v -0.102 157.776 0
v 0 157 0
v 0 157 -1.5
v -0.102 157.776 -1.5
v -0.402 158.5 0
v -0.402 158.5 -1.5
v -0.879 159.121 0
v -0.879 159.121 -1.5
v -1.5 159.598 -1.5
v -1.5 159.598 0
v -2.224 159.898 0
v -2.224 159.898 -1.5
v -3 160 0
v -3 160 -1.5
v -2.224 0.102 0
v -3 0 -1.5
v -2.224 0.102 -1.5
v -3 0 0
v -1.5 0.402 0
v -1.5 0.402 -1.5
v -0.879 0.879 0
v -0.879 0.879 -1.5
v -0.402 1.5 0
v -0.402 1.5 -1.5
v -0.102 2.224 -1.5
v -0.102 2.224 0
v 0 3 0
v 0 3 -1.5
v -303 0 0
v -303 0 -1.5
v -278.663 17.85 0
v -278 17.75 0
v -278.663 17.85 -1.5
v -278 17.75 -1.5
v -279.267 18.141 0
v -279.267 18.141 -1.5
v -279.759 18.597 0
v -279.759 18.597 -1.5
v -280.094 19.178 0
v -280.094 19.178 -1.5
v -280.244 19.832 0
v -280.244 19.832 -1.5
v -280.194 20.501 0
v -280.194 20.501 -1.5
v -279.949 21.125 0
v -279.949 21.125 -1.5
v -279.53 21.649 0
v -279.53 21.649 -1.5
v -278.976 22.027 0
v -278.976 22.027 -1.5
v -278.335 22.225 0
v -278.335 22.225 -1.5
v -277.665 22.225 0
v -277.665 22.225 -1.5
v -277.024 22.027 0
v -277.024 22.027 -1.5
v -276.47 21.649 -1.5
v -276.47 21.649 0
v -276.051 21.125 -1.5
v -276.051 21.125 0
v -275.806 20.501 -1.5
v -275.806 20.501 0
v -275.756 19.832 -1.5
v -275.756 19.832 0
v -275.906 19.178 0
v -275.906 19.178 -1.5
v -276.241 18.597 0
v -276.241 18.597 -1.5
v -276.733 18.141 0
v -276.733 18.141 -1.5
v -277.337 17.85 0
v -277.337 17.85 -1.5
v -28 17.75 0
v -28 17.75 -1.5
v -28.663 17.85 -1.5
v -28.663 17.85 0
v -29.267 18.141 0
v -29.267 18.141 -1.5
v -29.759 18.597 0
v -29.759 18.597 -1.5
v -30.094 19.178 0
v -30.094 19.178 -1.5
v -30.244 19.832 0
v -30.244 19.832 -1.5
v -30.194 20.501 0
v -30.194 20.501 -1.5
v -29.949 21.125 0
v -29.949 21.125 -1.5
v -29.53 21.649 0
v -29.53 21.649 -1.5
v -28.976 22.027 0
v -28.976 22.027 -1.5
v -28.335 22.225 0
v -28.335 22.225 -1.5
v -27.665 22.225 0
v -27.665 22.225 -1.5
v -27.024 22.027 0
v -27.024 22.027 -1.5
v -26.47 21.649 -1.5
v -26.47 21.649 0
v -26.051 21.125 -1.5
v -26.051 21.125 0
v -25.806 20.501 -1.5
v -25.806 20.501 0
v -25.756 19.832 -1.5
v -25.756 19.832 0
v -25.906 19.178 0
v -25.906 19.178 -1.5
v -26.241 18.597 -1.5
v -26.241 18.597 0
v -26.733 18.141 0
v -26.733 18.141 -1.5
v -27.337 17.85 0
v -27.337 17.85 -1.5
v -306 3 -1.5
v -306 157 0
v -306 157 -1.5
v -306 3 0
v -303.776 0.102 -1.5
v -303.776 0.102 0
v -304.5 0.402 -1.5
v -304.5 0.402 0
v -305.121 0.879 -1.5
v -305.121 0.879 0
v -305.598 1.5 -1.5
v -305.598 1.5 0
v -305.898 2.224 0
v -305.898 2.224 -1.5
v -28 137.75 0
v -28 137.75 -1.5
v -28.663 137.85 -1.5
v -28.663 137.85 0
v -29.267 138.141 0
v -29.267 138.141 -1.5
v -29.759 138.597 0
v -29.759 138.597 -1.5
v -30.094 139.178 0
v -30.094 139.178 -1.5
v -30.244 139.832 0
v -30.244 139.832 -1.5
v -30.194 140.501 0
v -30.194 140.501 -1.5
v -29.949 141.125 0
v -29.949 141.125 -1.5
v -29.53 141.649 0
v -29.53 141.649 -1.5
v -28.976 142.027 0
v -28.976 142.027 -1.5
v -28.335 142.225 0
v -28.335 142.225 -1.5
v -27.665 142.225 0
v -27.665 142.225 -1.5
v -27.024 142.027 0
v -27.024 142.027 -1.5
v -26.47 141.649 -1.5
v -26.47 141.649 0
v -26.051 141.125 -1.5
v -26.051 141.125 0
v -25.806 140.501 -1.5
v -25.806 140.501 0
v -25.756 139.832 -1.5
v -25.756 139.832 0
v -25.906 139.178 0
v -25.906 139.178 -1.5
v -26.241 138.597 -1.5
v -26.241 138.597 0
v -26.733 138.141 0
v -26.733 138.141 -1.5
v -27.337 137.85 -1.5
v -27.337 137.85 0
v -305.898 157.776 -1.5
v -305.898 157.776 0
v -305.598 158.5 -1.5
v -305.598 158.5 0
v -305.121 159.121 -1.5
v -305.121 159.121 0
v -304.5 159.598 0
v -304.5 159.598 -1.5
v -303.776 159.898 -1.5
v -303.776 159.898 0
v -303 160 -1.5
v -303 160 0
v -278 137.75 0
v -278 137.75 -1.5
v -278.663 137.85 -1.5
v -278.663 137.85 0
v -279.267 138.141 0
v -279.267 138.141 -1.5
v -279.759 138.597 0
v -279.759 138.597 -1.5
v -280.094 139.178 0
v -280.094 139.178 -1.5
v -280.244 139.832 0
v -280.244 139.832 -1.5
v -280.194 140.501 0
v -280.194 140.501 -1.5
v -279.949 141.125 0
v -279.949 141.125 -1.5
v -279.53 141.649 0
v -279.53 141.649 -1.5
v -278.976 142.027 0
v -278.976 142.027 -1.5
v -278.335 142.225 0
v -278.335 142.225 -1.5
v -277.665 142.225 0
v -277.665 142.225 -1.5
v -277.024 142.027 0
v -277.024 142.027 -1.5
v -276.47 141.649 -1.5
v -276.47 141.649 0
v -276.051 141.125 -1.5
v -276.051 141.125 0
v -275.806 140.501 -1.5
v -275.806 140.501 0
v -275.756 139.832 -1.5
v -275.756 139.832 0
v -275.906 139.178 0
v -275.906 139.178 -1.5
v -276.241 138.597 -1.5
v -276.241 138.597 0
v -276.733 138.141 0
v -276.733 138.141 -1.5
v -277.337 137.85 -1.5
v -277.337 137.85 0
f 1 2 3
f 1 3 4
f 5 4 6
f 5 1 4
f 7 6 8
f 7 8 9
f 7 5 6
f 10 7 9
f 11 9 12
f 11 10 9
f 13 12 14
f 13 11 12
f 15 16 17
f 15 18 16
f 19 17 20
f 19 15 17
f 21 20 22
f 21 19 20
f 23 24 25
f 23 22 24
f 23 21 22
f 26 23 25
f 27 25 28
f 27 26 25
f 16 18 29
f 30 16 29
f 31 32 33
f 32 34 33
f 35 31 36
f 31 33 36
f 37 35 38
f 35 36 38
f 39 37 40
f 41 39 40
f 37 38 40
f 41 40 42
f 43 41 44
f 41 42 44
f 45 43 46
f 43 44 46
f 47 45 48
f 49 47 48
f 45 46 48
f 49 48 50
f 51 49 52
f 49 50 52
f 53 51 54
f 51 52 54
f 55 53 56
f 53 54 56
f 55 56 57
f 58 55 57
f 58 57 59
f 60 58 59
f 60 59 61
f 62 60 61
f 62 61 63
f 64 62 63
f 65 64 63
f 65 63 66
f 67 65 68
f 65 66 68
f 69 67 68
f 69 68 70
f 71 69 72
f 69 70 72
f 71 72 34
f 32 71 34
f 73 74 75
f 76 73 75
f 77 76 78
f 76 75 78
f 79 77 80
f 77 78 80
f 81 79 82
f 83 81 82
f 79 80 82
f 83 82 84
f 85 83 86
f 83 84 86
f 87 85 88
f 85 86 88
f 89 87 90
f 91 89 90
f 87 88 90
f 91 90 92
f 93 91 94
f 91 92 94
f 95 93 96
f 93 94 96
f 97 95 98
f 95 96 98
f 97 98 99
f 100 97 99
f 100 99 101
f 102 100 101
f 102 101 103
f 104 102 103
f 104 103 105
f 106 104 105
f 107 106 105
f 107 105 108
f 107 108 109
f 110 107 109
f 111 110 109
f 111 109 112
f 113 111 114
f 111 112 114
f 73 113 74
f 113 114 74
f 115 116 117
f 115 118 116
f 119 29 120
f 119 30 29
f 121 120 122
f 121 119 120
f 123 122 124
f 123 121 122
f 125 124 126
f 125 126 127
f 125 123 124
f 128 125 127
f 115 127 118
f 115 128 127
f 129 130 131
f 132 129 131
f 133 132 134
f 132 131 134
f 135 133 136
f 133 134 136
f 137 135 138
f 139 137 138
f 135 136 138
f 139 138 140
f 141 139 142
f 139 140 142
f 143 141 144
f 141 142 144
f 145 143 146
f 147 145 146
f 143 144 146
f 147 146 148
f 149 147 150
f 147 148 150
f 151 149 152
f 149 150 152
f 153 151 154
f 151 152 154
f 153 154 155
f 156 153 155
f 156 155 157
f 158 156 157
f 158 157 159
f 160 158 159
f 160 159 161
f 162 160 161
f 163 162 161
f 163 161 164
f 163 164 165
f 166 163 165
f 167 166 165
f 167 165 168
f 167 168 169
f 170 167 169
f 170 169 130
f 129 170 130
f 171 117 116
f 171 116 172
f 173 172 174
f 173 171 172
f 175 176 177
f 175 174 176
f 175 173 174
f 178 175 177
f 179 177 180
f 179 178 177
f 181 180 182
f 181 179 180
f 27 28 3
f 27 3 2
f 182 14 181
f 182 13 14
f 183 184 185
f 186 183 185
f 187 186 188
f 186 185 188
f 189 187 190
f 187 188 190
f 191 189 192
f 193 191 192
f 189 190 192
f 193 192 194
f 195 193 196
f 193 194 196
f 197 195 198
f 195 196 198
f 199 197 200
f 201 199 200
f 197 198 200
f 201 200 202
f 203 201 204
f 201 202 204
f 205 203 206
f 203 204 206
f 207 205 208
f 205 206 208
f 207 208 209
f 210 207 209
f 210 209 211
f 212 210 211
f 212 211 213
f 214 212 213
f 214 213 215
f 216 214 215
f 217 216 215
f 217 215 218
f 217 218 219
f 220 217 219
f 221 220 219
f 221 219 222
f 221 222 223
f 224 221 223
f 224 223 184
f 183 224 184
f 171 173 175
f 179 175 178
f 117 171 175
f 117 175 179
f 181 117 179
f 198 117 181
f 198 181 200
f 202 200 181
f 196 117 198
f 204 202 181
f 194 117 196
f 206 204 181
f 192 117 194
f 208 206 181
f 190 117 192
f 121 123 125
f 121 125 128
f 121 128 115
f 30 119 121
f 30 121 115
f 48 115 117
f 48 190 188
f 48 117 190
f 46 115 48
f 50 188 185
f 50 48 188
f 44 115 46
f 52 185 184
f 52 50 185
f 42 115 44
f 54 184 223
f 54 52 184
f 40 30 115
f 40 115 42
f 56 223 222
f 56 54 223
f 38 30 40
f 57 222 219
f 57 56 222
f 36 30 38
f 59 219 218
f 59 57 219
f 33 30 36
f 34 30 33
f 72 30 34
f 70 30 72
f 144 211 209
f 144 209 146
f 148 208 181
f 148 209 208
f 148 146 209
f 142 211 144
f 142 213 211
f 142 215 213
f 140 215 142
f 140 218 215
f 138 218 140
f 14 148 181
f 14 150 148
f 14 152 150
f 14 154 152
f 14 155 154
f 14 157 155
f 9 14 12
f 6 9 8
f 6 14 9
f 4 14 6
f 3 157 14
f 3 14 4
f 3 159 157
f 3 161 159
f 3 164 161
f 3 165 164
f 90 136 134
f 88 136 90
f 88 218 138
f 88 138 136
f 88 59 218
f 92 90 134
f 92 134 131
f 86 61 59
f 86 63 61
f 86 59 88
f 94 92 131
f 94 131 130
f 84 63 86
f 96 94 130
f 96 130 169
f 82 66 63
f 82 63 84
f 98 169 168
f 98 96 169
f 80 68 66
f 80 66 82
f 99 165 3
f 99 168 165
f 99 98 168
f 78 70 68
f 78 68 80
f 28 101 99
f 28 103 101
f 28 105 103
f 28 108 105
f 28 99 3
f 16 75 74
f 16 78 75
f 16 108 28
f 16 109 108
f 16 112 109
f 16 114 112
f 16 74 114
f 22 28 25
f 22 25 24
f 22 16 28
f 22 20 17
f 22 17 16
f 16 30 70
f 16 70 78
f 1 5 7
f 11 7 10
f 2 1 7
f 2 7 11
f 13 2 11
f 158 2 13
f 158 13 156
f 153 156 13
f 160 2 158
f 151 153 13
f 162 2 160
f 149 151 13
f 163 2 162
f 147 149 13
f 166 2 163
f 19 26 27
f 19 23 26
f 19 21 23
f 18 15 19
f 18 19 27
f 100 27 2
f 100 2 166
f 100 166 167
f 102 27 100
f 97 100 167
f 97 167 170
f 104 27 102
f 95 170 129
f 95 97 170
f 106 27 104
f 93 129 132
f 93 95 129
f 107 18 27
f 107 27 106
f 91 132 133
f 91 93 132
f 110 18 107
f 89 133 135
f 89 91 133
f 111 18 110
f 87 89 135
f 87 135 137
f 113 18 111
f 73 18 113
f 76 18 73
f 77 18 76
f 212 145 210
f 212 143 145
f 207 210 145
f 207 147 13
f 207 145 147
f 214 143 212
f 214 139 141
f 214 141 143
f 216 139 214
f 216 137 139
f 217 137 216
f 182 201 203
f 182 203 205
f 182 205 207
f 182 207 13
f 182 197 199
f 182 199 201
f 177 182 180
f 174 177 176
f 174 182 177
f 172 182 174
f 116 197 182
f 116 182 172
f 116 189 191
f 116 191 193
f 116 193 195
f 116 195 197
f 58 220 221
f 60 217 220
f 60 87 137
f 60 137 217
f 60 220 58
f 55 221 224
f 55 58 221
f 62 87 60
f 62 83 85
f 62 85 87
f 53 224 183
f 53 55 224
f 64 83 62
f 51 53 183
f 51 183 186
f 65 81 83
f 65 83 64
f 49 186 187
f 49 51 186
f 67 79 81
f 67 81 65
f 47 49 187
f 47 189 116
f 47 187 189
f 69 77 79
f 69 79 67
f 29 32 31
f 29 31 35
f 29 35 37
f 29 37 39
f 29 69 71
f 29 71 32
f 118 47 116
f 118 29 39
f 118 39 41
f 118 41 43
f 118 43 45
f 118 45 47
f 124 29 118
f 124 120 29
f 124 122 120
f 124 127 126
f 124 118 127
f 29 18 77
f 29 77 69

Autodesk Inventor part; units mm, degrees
ref_plane "YZ Plane" through (0, 0, 0) normal (1, 0, 0) x (0, 1, 0)
ref_plane "XZ Plane" through (0, 0, 0) normal (0, 1, 0) x (-1, 0, 0)
ref_plane "XY Plane" through (0, 0, 0) normal (0, 0, 1) x (1, 0, 0)
sketch "Skizze1" plane through (0, 0, 0) normal (0, 1, 0) x (-1, 0, 0)
  line L0 (0, 0) -> (306, 0)
  line L1 (306, 0) -> (306, -1.5)
  line L2 (306, -1.5) -> (0, -1.5)
  line L3 (0, -1.5) -> (0, 0)
  dimension "d0" = 306
  dimension "d1" = 1.5
extrude "Extrusion1" add sketch "Skizze1" along normal blind 160
sketch "Skizze2" plane through (-306, 0, 0) normal (0, 0, 1) x (1, 0, 0)
  line L0 (278, 20) -> (28, 20)
  line L1 (28, 20) -> (28, 140)
  line L2 (28, 140) -> (278, 140)
  line L3 (278, 140) -> (278, 20)
  line L4 (278, 20) -> (28, 140) construction
  line L5 (28, 20) -> (278, 140) construction
  line L6 (0, 0) -> (0, 160) projected
  line L7 (0, 160) -> (306, 160) projected
  point P0 (306, 0)
  point P1 (153, 80)
  dimension "d4" = 306
  dimension "d5" = 160
  dimension "d6" = 153
  dimension "d7" = 80
  dimension "d8" = 250
  dimension "d9" = 120
hole "Bohrung1" at (-28, 20, 0) at (-28, 140, 0) at (-278, 140, 0) at (-278, 20, 0) direction (0, 0, -1) diameter 4.5 depth 11.8 tip angle 118
fillet "Rundung1" radius 3 4 edges at (-306, 160, -0.75) (-306, 0, -0.75) (0, 160, -0.75) (0, 0, -0.75)
equation "\"d6\" = 0.5 * d4"
equation "\"d7\" = 0.5 * d5"
properties part number "Deckel"
